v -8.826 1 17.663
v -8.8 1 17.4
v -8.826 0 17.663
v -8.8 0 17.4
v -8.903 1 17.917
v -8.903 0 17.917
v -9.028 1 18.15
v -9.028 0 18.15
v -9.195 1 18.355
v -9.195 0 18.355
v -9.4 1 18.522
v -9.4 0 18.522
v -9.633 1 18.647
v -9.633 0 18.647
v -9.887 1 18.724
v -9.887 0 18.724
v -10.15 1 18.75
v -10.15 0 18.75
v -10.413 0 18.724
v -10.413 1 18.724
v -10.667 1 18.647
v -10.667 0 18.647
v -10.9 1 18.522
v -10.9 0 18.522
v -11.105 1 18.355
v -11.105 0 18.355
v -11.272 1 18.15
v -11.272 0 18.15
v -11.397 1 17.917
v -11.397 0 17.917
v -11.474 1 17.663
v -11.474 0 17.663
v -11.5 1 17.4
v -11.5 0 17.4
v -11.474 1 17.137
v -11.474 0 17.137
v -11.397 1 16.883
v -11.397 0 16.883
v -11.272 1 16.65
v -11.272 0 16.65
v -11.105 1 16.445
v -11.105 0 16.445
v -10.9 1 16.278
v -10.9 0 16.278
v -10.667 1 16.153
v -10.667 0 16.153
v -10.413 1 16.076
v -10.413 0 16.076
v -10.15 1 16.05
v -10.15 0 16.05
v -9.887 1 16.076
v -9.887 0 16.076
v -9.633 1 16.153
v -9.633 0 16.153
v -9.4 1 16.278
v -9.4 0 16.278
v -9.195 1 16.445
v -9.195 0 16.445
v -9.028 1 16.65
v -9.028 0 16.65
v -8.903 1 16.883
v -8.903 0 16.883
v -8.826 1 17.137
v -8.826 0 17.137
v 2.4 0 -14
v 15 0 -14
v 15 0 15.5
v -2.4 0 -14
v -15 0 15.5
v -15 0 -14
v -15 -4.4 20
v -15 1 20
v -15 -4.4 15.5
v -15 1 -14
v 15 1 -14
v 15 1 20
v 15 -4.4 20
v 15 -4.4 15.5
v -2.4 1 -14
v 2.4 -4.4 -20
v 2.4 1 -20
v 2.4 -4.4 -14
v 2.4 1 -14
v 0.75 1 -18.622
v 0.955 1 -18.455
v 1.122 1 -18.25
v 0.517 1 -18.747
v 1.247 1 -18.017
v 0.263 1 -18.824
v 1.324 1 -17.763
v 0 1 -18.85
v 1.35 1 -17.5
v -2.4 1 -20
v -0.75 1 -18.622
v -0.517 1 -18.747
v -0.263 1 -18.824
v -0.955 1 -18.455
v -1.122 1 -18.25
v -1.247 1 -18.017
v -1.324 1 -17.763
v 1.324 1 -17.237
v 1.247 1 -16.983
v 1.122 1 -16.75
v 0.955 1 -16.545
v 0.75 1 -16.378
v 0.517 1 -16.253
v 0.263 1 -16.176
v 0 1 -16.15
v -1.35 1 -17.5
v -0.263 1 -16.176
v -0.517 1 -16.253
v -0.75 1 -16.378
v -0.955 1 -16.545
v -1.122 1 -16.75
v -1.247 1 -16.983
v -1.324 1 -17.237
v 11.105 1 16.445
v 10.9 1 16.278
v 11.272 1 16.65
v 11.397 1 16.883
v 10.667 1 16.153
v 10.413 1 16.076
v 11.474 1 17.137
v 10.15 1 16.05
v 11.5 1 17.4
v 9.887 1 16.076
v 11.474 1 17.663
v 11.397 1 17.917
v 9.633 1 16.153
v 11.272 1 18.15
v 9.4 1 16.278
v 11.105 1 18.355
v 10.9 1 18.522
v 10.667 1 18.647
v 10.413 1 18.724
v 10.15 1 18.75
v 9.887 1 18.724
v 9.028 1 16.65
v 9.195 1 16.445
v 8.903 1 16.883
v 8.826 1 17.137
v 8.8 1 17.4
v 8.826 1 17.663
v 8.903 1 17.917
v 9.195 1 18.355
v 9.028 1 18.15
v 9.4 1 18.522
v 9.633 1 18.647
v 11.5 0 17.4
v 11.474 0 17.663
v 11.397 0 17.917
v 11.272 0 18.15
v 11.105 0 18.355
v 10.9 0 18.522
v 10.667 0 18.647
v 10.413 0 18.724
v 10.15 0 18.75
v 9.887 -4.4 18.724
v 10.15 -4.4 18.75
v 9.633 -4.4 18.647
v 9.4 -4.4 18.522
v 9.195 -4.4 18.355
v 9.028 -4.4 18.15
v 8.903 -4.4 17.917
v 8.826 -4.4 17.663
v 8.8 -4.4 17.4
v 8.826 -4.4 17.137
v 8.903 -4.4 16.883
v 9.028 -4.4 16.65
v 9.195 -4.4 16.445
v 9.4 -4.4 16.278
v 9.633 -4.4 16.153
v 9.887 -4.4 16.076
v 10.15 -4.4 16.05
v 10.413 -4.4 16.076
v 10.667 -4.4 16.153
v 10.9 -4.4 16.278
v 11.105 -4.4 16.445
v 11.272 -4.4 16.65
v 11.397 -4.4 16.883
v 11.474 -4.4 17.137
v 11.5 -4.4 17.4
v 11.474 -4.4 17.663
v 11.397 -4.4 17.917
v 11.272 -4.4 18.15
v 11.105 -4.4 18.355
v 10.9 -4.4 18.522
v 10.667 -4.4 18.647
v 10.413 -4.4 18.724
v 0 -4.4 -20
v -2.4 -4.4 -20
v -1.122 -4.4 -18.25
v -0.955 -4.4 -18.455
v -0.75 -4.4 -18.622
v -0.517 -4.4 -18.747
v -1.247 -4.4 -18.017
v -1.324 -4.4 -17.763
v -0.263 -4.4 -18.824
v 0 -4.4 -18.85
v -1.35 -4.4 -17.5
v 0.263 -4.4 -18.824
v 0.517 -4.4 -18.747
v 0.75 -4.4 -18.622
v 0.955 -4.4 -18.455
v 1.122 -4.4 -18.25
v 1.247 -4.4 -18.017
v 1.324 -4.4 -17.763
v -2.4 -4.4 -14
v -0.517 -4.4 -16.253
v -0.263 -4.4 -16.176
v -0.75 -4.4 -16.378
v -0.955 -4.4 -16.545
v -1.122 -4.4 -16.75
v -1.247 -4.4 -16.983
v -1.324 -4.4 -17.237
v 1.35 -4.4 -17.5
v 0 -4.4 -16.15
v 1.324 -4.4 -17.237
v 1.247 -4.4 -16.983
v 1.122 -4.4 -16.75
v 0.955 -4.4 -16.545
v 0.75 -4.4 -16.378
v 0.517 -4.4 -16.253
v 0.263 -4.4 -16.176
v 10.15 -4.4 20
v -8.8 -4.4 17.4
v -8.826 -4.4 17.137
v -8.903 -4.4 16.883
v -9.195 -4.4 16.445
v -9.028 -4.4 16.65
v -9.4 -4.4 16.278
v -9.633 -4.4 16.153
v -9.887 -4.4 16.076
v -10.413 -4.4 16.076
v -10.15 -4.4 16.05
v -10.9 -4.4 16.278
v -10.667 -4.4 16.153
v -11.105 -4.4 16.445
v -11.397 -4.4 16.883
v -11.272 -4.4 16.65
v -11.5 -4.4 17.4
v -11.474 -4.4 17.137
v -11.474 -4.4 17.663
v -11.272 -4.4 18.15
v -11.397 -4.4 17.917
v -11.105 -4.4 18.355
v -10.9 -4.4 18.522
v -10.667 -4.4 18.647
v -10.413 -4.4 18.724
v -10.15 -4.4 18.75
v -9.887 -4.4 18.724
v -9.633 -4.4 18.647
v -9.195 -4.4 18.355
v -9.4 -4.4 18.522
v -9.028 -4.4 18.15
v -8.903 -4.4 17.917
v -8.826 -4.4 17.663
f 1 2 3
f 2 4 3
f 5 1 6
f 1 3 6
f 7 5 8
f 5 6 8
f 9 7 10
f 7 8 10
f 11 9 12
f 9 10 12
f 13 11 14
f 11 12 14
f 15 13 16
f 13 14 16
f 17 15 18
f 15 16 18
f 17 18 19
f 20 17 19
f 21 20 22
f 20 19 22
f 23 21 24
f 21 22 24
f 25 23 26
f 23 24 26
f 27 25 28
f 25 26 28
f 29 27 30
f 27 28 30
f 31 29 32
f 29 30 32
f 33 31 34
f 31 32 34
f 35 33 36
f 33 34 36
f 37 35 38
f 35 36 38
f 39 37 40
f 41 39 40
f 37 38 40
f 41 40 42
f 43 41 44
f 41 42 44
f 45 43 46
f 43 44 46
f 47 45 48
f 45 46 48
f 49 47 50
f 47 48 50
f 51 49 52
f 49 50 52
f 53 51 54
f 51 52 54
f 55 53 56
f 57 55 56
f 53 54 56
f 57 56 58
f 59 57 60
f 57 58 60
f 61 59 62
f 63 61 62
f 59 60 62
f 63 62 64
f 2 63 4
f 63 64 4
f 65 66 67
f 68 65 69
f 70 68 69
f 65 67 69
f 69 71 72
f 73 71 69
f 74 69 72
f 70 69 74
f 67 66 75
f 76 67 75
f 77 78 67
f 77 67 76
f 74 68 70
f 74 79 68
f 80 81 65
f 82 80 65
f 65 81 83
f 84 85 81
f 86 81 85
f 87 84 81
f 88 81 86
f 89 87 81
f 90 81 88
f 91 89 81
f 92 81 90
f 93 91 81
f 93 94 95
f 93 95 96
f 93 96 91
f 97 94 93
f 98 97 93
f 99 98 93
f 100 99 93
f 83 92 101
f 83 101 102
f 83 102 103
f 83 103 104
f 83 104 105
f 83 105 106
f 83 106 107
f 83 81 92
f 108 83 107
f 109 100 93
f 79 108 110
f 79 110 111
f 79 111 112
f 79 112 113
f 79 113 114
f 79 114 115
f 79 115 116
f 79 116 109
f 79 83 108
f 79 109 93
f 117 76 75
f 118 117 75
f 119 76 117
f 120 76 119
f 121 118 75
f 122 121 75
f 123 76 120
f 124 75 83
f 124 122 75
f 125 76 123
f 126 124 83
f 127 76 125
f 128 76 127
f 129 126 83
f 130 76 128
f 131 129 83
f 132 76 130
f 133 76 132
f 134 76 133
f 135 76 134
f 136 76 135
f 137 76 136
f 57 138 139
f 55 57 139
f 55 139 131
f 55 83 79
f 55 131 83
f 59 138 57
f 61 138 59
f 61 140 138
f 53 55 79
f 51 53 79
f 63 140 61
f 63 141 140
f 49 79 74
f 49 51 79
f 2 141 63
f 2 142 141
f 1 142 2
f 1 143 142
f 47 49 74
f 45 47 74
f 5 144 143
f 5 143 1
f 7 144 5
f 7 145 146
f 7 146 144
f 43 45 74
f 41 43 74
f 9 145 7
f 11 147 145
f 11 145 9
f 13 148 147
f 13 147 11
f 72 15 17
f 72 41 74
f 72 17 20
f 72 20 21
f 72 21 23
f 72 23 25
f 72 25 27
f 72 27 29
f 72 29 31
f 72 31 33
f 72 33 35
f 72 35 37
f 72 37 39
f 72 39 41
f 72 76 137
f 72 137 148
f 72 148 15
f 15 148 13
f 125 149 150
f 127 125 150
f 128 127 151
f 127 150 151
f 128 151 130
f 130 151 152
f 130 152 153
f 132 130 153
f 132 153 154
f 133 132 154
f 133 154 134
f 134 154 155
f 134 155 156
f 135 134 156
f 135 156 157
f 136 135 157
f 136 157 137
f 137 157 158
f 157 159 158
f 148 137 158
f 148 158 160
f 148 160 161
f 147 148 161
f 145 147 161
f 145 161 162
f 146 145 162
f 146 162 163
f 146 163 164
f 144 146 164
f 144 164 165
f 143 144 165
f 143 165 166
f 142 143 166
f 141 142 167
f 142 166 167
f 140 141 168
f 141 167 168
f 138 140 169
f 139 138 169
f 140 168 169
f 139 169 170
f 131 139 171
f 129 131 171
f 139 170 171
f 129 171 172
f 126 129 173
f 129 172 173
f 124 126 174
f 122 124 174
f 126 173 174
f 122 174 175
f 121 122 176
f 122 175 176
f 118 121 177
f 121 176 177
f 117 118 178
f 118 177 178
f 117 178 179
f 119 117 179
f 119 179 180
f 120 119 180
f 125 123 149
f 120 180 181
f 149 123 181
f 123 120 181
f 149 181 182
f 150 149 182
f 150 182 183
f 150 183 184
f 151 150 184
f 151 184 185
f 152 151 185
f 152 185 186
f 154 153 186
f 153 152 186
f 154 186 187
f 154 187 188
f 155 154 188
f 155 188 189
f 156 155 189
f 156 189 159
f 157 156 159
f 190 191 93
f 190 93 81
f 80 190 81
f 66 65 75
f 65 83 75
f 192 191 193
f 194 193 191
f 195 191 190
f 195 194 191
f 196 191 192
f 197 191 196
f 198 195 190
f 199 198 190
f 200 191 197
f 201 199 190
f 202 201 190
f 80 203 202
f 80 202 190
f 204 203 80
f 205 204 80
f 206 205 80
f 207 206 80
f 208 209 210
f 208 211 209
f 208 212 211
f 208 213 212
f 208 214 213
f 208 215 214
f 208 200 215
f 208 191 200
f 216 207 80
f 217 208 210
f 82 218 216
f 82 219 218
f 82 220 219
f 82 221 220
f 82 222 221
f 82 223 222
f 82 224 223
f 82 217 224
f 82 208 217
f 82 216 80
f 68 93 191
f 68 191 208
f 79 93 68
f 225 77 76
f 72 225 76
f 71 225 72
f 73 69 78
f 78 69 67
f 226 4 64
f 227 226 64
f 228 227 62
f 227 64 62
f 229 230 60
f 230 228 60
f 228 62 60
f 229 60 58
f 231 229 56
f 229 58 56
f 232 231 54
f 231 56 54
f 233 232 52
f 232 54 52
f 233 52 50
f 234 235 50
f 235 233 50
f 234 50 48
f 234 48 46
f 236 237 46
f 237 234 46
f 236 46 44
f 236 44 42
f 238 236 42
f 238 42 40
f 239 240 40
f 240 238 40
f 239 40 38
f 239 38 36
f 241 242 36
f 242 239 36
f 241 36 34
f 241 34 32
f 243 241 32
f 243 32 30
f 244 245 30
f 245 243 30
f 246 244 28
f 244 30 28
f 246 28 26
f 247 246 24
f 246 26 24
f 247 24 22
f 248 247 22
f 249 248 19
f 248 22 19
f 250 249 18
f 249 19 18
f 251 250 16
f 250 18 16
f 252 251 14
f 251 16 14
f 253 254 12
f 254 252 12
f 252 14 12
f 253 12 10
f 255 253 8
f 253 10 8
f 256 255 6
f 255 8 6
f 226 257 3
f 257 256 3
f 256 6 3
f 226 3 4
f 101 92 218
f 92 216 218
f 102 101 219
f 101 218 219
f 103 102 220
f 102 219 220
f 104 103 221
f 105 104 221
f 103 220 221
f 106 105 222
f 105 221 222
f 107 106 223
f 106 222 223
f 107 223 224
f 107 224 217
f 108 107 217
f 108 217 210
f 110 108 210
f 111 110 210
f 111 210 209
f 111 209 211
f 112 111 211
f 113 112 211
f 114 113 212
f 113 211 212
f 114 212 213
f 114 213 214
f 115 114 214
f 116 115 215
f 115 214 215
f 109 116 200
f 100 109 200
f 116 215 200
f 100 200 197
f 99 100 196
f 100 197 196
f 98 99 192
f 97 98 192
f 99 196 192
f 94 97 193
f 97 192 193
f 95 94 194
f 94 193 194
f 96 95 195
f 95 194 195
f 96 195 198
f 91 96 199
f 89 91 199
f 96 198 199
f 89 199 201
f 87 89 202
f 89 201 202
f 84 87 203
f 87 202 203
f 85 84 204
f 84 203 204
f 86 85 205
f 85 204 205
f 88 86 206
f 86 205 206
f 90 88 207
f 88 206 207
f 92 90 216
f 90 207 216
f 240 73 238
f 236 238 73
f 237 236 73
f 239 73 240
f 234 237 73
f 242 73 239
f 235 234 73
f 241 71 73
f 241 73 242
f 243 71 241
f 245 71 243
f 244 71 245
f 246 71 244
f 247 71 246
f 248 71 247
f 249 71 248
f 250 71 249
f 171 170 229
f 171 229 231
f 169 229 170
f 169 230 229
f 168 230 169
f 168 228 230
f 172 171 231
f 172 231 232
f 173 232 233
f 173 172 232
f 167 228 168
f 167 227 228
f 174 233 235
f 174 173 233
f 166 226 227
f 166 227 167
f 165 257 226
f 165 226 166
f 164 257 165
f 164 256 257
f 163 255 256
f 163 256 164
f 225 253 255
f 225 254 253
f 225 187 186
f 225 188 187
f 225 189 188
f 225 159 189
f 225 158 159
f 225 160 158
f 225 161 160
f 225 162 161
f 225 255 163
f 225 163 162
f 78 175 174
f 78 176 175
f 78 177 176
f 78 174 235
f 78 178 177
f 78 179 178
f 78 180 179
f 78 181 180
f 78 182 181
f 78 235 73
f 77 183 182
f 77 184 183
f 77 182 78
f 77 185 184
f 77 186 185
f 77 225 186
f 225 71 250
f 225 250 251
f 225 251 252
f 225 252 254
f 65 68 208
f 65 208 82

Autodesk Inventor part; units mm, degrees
ref_plane "YZ Plane" through (0, 0, 0) normal (1, 0, 0) x (0, 1, 0)
ref_plane "XZ Plane" through (0, 0, 0) normal (0, 1, 0) x (-1, 0, 0)
ref_plane "XY Plane" through (0, 0, 0) normal (0, 0, 1) x (1, 0, 0)
sketch "Sketch1" plane through (0, 0, 0) normal (0, 1, 0) x (-1, 0, 0)
  line L0 (-15, 20) -> (15, 20)
  line L1 (15, 20) -> (15, -20)
  line L2 (15, -20) -> (-15, -20)
  line L3 (-15, -20) -> (-15, 20)
  line L4 (-15, 20) -> (15, -20) construction
  line L5 (15, 20) -> (-15, -20) construction
  point P0 (0, 0)
  dimension "d0" = 30
  dimension "d1" = 40
extrude "Extrusion1" add sketch "Sketch1" along normal blind 1
sketch "Sketch3" plane through (0, 1, 0) normal (0, 1, 0) x (1, 0, 0)
  line L0 (15, 20) -> (-15, 20) projected
  line L1 (-15, 20) -> (-2.4, 20)
  line L2 (-2.4, 20) -> (-2.4, 14)
  line L3 (-2.4, 14) -> (-15, 14)
  line L4 (-15, 14) -> (-15, 20)
  line L5 (0, 0) -> (0, 20) construction
  line L6 (15, 20) -> (2.4, 20)
  line L7 (2.4, 20) -> (2.4, 14)
  line L8 (2.4, 14) -> (15, 14)
  line L9 (15, 14) -> (15, 20)
  dimension "d7" = 12.6
  dimension "d8" = 6
  dimension "d9" = 12.6
  dimension "d10" = 6
extrude "Extrusion3" cut sketch "Sketch3" against normal up to surface (1 mm away)
sketch "Sketch8" plane through (0, 0, 0) normal (0, -1, 0) x (1, 0, 0)
  line L0 (2.4, -20) -> (-2.4, -20) projected
  line L1 (2.4, -20) -> (0, -20)
  line L2 (0, -20) -> (0, -17.5)
  line L3 (-2.4, -20) -> (-2.4, -14) projected
  line L4 (2.4, -20) -> (-2.4, -20)
  line L5 (-2.4, -20) -> (-2.4, -14)
  line L6 (-2.4, -14) -> (2.4, -14)
  line L7 (2.4, -14) -> (2.4, -20)
  line L8 (-15, 20) -> (15, 20) projected
  line L9 (15, 20) -> (10.15, 20)
  line L10 (15, 20) -> (19.85, 20) construction
  line L11 (10.15, 20) -> (10.15, 17.4)
  line L12 (10.15, 17.4) -> (-10.15, 17.4)
  line L13 (10.15, 17.4) -> (30.45, 17.4) construction
  circle A0 centre (-10.15, 17.4) radius 1.35
  circle A1 centre (10.15, 17.4) radius 1.35
  line L14 (15, 20) -> (15, -14) projected
  line L15 (15, 20) -> (-15, 20)
  line L16 (-15, 20) -> (-15, 15.5)
  line L17 (-15, 15.5) -> (15, 15.5)
  line L18 (15, 15.5) -> (15, 20)
  circle A2 centre (0, -17.5) radius 1.35
  point P0 (0, 0)
  dimension "d34" = 2.5
  dimension "d35" = 4.85
  dimension "d36" = 180
  dimension "d39" = 2.6
  dimension "d40" = 20.3
  dimension "d41" = 180
  dimension "d42" = 2.7
  dimension "d43" = 2.7
  dimension "d44" = 30
  dimension "d45" = 4.5
  dimension "d46" = 2.7
extrude "Extrusion7" add sketch "Sketch8" along normal blind 4.4
sketch "Sketch9" plane through (0, 0, 0) normal (0, -1, 0) x (1, 0, 0)
  circle A0 centre (10.15, 17.4) radius 1.35 projected
  circle A1 centre (-10.15, 17.4) radius 1.35 projected
  circle A2 centre (0, -17.5) radius 1.35 projected
  point P0 (0, 0)
extrude "Extrusion8" cut sketch "Sketch9" against normal up to surface (1 mm away)
properties part number "imu_bottom_cover"
